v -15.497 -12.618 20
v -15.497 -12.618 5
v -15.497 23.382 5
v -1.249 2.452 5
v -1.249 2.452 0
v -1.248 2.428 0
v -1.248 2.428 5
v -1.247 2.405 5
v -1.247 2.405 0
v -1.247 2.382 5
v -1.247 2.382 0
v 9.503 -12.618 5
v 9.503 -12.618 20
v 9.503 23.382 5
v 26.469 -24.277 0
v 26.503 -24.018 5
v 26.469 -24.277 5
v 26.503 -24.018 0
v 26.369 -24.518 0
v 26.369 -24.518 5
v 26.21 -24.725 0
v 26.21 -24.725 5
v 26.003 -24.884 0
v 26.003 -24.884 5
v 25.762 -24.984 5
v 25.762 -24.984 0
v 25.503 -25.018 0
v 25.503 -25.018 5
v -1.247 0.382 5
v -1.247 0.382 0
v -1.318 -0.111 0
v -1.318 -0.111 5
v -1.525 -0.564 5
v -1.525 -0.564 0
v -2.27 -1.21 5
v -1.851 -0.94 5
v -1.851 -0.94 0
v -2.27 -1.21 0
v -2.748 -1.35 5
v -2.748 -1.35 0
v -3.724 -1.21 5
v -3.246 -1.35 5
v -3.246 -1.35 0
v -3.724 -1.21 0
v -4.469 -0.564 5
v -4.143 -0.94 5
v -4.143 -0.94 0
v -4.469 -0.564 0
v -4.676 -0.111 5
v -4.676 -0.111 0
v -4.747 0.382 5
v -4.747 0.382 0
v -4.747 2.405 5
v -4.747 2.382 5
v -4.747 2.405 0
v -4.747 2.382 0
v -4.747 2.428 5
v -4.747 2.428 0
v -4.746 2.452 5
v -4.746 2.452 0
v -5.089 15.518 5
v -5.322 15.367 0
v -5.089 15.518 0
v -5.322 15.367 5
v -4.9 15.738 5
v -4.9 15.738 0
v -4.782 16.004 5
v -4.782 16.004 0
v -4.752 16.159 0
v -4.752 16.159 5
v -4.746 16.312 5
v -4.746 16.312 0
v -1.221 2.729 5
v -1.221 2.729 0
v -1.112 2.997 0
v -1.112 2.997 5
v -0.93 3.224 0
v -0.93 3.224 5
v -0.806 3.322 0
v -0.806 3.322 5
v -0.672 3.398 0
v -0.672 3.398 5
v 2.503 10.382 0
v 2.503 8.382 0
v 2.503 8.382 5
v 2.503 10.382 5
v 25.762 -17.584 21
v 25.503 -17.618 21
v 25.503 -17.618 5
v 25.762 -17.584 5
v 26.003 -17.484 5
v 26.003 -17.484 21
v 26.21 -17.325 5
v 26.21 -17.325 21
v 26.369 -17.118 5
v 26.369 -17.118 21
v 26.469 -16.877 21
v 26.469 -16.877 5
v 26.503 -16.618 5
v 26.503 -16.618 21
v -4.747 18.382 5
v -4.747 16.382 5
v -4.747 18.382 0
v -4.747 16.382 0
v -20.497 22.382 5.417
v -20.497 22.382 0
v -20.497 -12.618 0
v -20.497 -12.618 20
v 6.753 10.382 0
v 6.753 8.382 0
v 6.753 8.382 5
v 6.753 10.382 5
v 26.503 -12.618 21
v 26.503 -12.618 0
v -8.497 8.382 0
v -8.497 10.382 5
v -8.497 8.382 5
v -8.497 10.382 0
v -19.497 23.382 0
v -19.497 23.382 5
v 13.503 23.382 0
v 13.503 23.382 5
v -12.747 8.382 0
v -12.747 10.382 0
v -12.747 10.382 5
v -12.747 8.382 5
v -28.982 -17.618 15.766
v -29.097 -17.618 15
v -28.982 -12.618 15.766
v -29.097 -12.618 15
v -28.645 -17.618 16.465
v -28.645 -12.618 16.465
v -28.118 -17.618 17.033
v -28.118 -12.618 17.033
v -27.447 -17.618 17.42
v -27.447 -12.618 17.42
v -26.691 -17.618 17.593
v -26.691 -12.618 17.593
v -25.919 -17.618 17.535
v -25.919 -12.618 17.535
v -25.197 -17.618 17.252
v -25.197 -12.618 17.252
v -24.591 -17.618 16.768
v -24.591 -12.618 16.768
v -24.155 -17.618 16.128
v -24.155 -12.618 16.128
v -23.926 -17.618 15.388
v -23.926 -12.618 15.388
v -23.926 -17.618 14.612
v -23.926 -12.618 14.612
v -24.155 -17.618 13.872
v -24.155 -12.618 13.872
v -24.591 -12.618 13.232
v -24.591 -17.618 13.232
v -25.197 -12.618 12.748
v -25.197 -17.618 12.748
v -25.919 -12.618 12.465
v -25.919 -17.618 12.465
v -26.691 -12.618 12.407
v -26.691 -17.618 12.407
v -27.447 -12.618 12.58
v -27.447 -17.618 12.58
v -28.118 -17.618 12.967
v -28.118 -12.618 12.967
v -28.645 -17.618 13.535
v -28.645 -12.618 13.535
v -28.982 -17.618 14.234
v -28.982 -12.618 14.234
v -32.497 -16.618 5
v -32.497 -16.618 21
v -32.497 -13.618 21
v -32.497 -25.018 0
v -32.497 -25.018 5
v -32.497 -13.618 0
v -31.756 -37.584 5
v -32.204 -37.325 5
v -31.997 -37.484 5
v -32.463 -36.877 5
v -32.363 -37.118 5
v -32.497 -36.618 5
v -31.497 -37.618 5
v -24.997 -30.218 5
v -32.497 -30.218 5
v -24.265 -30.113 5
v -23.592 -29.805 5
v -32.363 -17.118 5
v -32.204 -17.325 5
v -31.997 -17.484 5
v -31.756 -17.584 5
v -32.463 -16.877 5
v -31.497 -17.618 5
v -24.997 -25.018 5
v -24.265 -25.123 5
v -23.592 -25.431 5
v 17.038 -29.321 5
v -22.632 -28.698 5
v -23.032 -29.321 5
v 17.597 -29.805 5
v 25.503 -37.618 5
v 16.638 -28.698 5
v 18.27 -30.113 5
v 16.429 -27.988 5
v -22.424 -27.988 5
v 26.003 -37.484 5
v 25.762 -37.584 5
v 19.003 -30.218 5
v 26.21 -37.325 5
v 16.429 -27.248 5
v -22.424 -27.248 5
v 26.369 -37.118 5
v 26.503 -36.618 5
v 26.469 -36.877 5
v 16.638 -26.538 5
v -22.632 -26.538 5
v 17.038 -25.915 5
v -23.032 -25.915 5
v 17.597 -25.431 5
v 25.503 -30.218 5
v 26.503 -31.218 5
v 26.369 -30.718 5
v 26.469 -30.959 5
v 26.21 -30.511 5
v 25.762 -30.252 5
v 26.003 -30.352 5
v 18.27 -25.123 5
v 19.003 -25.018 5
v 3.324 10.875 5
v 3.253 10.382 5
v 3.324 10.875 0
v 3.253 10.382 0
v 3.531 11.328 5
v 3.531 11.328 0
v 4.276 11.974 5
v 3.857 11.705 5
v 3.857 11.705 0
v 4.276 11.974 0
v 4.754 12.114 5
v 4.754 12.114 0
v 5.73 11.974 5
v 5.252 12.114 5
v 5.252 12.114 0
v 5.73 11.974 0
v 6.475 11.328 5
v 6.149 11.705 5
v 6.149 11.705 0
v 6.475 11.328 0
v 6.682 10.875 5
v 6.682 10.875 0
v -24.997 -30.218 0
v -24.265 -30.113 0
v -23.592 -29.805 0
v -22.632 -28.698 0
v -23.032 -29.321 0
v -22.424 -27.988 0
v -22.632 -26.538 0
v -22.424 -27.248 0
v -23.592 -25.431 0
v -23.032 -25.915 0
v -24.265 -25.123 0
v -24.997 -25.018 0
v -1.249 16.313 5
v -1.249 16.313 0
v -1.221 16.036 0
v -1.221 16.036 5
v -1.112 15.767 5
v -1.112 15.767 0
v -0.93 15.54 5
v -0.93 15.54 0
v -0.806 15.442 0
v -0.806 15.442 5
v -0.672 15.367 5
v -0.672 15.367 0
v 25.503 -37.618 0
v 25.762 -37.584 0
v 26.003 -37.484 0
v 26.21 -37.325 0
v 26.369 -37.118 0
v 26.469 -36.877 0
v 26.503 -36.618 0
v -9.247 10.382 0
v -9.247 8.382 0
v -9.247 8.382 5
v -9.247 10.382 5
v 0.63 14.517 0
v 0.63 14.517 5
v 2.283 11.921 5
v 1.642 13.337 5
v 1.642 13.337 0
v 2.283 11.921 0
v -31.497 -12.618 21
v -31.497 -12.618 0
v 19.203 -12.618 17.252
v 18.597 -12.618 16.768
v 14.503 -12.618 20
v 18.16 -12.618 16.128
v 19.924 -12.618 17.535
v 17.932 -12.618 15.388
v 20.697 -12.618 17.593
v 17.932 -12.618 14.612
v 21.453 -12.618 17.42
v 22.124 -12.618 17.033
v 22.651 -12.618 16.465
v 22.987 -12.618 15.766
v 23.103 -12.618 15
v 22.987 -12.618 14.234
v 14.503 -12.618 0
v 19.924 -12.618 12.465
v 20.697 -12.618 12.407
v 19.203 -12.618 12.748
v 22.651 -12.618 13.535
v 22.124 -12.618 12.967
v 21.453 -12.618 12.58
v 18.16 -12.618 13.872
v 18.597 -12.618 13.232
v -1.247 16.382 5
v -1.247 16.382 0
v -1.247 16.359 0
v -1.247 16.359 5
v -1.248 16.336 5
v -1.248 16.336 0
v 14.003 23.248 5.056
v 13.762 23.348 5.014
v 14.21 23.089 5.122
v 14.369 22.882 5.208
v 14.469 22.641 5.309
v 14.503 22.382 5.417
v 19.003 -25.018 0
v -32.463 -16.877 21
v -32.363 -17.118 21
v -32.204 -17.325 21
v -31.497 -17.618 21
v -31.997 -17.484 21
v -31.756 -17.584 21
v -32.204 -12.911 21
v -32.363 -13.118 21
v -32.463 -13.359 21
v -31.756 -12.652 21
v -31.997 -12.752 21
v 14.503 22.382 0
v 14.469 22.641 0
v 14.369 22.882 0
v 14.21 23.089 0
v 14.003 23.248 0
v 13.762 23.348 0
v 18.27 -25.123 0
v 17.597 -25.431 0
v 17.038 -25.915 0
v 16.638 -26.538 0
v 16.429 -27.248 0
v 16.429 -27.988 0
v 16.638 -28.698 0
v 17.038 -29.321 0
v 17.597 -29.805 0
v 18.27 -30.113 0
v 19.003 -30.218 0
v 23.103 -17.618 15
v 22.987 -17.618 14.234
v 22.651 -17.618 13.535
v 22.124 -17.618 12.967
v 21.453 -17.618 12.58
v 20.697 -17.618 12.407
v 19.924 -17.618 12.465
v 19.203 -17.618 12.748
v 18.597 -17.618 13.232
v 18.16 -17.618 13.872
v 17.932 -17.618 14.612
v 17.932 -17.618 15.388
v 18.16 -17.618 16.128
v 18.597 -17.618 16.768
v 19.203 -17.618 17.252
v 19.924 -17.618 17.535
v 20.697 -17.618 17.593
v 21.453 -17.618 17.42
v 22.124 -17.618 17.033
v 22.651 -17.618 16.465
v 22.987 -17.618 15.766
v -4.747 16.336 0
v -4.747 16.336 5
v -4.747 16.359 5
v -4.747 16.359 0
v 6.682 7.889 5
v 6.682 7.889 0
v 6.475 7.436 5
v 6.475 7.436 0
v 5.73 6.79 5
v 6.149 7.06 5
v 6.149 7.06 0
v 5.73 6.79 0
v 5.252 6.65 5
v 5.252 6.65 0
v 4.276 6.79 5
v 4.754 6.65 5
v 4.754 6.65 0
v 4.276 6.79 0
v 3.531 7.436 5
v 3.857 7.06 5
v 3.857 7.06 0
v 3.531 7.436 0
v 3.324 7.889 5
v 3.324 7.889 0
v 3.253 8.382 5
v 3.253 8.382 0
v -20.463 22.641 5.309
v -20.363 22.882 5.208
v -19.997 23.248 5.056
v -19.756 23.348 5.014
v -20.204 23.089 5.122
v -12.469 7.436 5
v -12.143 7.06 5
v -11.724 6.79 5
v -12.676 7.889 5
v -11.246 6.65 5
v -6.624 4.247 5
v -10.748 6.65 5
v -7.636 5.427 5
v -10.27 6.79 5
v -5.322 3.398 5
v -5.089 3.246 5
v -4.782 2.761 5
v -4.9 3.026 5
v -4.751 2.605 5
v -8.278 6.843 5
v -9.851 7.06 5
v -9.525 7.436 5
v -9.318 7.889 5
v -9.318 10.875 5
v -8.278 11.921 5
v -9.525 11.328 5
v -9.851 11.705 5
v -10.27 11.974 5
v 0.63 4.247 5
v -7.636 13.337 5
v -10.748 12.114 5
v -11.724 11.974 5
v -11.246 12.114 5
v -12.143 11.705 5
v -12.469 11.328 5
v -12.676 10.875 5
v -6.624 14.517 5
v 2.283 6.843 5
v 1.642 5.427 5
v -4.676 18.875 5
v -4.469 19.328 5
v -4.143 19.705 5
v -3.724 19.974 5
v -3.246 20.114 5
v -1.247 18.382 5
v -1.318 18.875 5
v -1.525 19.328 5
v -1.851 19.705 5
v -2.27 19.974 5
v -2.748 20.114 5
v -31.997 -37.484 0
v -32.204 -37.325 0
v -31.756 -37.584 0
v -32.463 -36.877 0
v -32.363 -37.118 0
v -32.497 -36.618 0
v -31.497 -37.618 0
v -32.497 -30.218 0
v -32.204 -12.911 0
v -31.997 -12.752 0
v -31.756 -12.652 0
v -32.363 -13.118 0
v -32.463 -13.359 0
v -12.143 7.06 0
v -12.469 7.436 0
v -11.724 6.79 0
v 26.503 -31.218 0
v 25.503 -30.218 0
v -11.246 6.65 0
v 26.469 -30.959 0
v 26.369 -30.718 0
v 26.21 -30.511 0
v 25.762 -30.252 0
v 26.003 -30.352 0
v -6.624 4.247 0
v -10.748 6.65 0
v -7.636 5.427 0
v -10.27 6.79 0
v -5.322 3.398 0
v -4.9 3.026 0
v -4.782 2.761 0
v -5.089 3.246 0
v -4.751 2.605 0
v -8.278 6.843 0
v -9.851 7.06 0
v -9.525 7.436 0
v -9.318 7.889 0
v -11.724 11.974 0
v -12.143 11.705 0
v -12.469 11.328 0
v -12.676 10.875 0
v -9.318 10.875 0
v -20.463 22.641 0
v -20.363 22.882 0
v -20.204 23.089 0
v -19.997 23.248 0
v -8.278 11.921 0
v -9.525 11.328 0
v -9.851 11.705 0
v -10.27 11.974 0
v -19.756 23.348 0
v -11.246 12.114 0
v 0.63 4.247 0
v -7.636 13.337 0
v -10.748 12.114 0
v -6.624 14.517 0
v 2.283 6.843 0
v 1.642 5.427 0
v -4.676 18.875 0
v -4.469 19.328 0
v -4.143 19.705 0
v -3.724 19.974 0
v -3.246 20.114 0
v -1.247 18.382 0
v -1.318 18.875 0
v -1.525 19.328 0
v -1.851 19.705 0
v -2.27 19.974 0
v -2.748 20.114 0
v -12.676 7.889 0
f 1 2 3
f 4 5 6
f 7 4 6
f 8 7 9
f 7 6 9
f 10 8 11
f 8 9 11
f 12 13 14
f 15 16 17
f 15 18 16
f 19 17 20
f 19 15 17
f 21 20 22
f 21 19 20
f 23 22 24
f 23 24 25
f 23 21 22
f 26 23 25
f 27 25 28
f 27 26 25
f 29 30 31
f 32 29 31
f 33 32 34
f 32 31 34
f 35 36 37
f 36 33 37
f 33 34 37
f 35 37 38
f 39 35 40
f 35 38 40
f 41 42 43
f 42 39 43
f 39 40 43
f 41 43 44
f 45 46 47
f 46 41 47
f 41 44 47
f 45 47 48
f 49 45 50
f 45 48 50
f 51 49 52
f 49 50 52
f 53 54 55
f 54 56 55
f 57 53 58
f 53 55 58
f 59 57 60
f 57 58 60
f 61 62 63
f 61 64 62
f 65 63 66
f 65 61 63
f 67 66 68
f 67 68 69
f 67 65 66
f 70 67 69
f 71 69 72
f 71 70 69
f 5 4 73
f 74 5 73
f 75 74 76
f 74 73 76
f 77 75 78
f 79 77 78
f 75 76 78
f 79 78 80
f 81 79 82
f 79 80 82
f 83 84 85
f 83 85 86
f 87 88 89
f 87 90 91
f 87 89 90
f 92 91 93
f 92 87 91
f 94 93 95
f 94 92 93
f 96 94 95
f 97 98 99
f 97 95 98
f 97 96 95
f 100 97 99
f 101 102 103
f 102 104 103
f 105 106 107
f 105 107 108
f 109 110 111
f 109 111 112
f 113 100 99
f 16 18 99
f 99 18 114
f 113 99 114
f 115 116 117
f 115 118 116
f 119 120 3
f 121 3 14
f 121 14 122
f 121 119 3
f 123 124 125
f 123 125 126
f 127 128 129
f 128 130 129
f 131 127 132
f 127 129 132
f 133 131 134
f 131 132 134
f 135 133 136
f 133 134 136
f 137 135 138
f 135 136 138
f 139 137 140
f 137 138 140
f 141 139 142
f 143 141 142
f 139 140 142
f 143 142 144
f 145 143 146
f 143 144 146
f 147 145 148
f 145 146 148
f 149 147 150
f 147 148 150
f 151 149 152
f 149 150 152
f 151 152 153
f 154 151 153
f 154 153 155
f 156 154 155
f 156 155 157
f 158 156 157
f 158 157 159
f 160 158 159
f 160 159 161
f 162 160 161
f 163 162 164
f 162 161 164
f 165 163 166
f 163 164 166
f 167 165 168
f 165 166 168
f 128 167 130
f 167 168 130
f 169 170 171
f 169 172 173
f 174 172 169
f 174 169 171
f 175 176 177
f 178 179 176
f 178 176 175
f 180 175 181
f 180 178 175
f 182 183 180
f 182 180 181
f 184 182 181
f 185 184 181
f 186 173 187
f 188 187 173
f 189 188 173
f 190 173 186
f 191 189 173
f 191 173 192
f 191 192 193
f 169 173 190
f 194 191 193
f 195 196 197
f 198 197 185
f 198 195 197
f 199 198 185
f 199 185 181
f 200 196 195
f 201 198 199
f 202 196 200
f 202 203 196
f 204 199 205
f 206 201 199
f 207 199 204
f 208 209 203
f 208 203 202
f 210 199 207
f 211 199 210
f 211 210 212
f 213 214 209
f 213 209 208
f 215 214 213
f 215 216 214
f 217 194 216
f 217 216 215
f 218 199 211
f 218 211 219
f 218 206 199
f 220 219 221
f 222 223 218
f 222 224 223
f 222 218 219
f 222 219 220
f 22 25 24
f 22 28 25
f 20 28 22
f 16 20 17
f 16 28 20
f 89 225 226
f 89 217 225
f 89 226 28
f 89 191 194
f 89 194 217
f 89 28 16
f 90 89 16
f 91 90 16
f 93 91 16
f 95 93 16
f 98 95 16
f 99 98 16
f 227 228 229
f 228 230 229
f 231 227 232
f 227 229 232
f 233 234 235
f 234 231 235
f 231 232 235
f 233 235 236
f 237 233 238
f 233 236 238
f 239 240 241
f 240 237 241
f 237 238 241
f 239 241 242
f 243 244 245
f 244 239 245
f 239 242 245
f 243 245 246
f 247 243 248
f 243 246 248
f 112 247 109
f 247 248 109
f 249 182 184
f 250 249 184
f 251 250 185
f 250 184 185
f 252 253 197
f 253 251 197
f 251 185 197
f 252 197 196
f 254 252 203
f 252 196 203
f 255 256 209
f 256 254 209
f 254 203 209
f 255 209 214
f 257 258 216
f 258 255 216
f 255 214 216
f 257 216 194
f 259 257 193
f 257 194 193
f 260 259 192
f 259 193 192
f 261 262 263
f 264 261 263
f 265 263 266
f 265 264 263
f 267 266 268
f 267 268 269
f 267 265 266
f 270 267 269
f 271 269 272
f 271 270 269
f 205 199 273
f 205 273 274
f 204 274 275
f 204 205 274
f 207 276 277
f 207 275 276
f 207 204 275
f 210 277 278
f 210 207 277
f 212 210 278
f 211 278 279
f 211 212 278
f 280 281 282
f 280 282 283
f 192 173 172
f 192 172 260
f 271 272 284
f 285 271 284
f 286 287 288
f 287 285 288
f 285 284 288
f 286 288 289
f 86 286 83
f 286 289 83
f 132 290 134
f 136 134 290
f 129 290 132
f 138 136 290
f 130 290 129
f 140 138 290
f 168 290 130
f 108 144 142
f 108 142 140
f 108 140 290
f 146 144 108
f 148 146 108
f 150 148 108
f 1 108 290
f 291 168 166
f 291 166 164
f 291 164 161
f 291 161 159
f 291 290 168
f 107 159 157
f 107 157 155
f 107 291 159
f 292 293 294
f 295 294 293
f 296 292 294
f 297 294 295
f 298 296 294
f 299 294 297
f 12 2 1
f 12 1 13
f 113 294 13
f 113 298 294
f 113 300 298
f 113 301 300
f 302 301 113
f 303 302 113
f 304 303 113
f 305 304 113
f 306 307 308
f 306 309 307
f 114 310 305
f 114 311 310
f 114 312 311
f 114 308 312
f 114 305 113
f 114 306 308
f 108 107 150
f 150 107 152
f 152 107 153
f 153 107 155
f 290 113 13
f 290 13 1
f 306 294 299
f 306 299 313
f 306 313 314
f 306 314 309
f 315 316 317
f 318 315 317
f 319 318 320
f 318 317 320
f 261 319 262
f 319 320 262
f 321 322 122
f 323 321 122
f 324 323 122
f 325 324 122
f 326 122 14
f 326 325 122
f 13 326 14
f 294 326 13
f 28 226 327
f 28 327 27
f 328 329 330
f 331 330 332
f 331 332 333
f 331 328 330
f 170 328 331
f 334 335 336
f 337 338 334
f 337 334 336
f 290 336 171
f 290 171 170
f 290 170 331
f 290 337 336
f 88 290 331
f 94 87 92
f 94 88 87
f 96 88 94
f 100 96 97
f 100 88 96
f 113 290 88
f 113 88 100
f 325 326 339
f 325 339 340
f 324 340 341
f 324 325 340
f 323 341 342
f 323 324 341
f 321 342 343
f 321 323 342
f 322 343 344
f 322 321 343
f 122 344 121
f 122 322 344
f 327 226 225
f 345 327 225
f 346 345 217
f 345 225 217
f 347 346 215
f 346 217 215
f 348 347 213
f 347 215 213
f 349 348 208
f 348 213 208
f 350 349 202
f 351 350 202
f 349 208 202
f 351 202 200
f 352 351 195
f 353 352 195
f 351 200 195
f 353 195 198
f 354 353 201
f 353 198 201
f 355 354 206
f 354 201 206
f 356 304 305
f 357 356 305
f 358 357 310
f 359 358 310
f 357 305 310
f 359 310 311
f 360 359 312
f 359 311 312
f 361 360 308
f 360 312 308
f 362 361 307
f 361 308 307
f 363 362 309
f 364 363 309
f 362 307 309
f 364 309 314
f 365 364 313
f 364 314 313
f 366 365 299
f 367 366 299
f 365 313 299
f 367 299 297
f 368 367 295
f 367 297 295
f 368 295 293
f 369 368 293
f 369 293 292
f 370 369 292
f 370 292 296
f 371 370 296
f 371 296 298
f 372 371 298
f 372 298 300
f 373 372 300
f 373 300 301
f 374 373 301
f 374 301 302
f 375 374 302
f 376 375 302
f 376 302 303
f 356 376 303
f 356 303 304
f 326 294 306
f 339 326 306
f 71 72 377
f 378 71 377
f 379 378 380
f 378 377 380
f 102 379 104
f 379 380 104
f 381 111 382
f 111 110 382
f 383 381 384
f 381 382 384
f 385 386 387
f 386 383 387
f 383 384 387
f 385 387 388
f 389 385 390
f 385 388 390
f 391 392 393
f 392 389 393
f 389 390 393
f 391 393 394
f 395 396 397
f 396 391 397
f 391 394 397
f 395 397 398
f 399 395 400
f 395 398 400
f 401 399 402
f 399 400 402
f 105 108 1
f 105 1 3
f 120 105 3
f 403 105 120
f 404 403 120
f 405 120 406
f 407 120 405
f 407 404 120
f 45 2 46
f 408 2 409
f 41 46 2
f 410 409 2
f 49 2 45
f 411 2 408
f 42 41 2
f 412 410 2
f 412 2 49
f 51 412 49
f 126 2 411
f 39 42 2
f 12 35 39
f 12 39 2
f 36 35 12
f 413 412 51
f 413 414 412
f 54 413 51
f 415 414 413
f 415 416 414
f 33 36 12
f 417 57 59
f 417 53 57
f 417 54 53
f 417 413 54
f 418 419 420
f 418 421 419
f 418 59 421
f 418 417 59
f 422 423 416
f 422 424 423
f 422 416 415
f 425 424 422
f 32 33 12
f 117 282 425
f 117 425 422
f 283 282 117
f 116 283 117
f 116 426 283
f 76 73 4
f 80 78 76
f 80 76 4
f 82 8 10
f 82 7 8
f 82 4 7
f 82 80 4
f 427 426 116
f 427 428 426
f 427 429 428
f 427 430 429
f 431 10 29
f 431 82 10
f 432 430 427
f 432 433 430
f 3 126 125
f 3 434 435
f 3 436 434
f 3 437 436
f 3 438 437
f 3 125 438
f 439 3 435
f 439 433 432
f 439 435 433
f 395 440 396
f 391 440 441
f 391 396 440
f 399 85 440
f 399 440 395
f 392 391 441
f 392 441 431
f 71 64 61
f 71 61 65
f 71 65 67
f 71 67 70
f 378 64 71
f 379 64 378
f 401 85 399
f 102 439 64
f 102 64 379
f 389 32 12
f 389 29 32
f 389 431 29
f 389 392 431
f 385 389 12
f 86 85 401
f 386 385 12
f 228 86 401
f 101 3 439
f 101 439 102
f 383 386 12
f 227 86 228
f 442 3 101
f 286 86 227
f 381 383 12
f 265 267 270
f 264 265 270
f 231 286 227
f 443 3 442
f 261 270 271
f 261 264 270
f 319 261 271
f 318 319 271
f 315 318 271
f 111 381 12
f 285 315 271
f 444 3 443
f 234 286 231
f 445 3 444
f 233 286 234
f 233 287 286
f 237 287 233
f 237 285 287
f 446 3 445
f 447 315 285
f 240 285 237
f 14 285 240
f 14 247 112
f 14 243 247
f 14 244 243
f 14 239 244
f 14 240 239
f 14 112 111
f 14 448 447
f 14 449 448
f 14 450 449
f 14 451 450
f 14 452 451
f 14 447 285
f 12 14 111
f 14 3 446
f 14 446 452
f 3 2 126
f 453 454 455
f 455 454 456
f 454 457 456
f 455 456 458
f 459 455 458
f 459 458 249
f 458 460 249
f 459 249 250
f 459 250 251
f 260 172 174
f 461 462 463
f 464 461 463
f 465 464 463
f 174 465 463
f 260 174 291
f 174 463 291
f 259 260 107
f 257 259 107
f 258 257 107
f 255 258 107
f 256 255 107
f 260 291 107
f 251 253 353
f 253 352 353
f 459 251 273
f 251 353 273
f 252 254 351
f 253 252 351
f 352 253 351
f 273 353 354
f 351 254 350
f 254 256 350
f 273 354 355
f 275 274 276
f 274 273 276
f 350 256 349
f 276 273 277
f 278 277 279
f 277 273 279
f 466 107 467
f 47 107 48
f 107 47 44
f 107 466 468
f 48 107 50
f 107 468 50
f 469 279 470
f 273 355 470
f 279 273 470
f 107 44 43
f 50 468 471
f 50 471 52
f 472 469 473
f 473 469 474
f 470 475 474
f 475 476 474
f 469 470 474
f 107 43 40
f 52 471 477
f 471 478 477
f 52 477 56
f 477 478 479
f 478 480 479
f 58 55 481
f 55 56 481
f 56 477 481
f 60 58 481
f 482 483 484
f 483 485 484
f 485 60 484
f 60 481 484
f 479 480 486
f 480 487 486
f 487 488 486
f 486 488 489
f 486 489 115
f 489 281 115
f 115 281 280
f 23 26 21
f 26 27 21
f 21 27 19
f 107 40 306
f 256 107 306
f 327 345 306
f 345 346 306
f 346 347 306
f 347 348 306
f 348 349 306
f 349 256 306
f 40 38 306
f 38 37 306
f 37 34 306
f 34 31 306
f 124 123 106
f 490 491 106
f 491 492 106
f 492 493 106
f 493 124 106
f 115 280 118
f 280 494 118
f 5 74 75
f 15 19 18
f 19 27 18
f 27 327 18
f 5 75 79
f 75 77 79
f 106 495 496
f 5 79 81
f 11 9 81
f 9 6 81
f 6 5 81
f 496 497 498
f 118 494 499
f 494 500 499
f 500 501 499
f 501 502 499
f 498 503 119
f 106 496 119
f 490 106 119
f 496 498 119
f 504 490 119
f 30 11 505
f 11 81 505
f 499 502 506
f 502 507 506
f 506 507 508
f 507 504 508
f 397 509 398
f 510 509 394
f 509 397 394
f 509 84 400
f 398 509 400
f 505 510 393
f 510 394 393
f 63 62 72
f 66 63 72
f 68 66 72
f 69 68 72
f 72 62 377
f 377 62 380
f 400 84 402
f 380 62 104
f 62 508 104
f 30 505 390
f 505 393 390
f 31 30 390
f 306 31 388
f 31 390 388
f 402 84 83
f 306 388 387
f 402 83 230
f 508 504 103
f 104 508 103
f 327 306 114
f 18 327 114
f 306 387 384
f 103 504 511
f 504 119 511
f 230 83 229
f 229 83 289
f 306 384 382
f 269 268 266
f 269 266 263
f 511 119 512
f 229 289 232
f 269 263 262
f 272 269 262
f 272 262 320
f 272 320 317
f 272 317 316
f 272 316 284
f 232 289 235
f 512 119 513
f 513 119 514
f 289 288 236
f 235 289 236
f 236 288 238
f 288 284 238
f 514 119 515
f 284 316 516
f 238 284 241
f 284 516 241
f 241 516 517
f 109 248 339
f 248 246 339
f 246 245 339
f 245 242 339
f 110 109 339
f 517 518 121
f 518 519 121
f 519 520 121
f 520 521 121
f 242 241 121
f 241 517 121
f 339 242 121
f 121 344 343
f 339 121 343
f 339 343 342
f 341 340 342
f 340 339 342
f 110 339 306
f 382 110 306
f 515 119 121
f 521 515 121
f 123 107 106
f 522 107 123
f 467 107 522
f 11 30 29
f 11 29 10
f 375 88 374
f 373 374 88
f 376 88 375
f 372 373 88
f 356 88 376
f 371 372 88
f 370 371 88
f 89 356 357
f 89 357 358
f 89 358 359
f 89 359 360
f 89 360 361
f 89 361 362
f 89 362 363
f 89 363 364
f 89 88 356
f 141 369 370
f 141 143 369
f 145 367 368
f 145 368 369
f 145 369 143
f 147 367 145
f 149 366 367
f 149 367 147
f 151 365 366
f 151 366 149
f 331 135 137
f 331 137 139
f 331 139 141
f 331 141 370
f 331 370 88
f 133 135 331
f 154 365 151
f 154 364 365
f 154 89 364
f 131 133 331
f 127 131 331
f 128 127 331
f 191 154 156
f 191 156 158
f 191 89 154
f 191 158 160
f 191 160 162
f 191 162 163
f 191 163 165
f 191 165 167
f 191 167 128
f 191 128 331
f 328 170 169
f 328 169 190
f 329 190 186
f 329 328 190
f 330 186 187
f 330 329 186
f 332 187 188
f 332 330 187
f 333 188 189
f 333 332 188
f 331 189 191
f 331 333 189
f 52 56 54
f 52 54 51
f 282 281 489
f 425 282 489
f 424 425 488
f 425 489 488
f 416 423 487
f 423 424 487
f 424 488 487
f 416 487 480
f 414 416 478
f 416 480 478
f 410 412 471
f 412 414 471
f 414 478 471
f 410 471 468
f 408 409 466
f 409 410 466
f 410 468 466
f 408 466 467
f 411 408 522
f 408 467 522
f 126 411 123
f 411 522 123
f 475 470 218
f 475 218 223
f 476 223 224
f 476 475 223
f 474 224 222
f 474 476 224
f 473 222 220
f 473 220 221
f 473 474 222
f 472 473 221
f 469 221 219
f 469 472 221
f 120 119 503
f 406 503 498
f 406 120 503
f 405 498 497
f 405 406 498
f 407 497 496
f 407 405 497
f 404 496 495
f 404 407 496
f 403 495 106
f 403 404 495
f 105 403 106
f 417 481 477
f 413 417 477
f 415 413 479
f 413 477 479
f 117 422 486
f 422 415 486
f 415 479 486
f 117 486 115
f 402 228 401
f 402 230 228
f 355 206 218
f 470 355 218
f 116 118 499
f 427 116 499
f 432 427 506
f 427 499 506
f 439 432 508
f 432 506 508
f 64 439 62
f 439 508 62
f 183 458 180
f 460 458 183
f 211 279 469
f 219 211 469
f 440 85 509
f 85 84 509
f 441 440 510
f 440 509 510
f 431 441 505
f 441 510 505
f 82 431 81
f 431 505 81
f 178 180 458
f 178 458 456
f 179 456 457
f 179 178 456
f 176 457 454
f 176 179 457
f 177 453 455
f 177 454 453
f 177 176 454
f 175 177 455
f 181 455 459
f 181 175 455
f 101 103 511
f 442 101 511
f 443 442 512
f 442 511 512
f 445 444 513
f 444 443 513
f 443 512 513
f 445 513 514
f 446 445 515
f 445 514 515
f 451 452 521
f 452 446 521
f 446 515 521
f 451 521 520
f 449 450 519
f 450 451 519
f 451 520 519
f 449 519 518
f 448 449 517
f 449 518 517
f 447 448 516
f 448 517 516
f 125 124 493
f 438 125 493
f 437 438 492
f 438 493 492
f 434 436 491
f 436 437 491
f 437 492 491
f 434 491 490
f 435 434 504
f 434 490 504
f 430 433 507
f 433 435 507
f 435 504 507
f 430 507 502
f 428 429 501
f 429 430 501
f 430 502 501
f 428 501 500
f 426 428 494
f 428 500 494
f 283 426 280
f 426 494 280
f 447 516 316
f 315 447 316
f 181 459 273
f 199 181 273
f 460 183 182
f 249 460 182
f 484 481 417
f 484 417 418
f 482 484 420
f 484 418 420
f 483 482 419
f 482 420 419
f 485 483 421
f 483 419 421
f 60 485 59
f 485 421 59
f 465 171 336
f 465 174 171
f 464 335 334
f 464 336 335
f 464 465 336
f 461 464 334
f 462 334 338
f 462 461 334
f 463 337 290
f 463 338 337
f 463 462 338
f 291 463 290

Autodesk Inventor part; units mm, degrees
ref_plane "YZ Plane" through (0, 0, 0) normal (1, 0, 0) x (0, 1, 0)
ref_plane "XZ Plane" through (0, 0, 0) normal (0, 1, 0) x (-1, 0, 0)
sketch "Sketch1" plane through (0, 0, 0) normal (0, 0, 1) x (1, 0, 0)
  line L0 (9.5028, 23.3821) -> (9.5028, -12.6179)
  line L1 (14.5028, 23.3821) -> (14.5028, -12.6179)
  line L2 (26.5028, -12.6179) -> (26.5028, -37.6179)
  line L3 (-32.4972, -17.6179) -> (26.5028, -17.6179)
  line L4 (-32.4972, -12.6179) -> (-20.4972, -12.6179)
  line L5 (-15.4972, -12.6179) -> (9.5028, -12.6179)
  line L6 (14.5028, -12.6179) -> (26.5028, -12.6179)
  line L7 (-20.4972, 23.3821) -> (14.5028, 23.3821)
  line L8 (-15.4972, 23.3821) -> (-15.4972, -12.6179)
  line L9 (-20.4972, 23.3821) -> (-20.4972, -12.6179)
  line L10 (-32.4972, -37.6179) -> (26.5028, -37.6179)
  line L11 (-32.4972, -12.6179) -> (-32.4972, -37.6179)
  line L12 (-2.9972, 1.3821) -> (-2.9972, 17.3821) construction
  line L13 (5.0028, 9.3821) -> (-10.9972, 9.3821) construction
  circle A0 centre (-2.9972, 9.3821) radius 8 construction
  line L14 (-2.9972, 10.3821) -> (-2.9972, 8.3821) construction
  line L15 (-8.4972, 10.3821) -> (-8.4972, 8.3821)
  line L16 (2.5028, 8.3821) -> (2.5028, 10.3821)
  line L17 (-2.9972, 2.3821) -> (-2.9972, 0.3821) construction
  line L18 (-4.7472, 2.3821) -> (-4.7472, 0.3821)
  line L19 (-1.2472, 0.3821) -> (-1.2472, 2.3821)
  arc A1 (-4.7472, 0.3821) -> (-1.2472, 0.3821) centre (-2.9972, 0.3821) ccw
  line L20 (-10.9972, 10.3821) -> (-10.9972, 8.3821) construction
  line L21 (-12.7472, 10.3821) -> (-12.7472, 8.3821)
  line L22 (-9.2472, 8.3821) -> (-9.2472, 10.3821)
  arc A2 (-9.2472, 10.3821) -> (-12.7472, 10.3821) centre (-10.9972, 10.3821) ccw
  arc A3 (-12.7472, 8.3821) -> (-9.2472, 8.3821) centre (-10.9972, 8.3821) ccw
  line L23 (5.0028, 10.3821) -> (5.0028, 8.3821) construction
  line L24 (3.2528, 10.3821) -> (3.2528, 8.3821)
  line L25 (6.7528, 8.3821) -> (6.7528, 10.3821)
  arc A4 (6.7528, 10.3821) -> (3.2528, 10.3821) centre (5.0028, 10.3821) ccw
  arc A5 (3.2528, 8.3821) -> (6.7528, 8.3821) centre (5.0028, 8.3821) ccw
  line L26 (-2.9972, 18.3821) -> (-2.9972, 16.3821) construction
  line L27 (-1.2472, 18.3821) -> (-1.2472, 16.3821)
  line L28 (-4.7472, 16.3821) -> (-4.7472, 18.3821)
  arc A6 (-1.2472, 18.3821) -> (-4.7472, 18.3821) centre (-2.9972, 18.3821) ccw
  arc A7 (-1.2472, 2.3821) -> (-1.4087, 3.1165) centre (-2.9972, 2.3821) ccw
  arc A8 (-4.5856, 3.1165) -> (-4.7472, 2.3821) centre (-2.9972, 2.3821) ccw
  arc A9 (-8.4972, 8.3821) -> (-4.5856, 3.1165) centre (-2.9972, 8.3821) ccw
  arc A10 (-1.4087, 3.1165) -> (2.5028, 8.3821) centre (-2.9972, 8.3821) ccw
  arc A11 (-4.7472, 16.3821) -> (-4.5856, 15.6478) centre (-2.9972, 16.3821) ccw
  arc A12 (-1.4087, 15.6478) -> (-1.2472, 16.3821) centre (-2.9972, 16.3821) ccw
  arc A13 (2.5028, 10.3821) -> (-1.4087, 15.6478) centre (-2.9972, 10.3821) ccw
  arc A14 (-4.5856, 15.6478) -> (-8.4972, 10.3821) centre (-2.9972, 10.3821) ccw
  point P0 (0, 0)
  point P1 (14.5028, 29.202)
  point P2 (-20.4972, 29.202)
  dimension "d51" = 16
  dimension "d52" = 5
  dimension "d53" = 5
  dimension "d54" = 25
  dimension "d55" = 5
  dimension "d56" = 20
  dimension "d58" = 27
  dimension "d59" = 14
  dimension "d60" = 12
  dimension "d61" = 12
  dimension "d64" = 12.5
  dimension "d66" = 2
  dimension "d67" = 3.5
  dimension "d68" = 2
  dimension "d69" = 3.5
  dimension "d70" = 2
  dimension "d71" = 3.5
  dimension "d72" = 2
  dimension "d73" = 3.5
  dimension "d74" = 2
extrude "Extrusion1" add sketch "Sketch1" along normal blind 5
sketch "Sketch2" plane through (0, 0, 5) normal (0, 0, 1) x (1, 0, 0)
  line L0 (26.5028, -37.6179) -> (26.5028, -12.6179) projected
  line L1 (-32.4972, -12.6179) -> (26.5028, -12.6179)
  line L2 (26.5028, -12.6179) -> (26.5028, -17.6179)
  line L3 (26.5028, -17.6179) -> (-32.4972, -17.6179)
  line L4 (-32.4972, -17.6179) -> (-32.4972, -12.6179)
  line L5 (-32.4972, -12.6179) -> (-32.4972, -37.6179) projected
  line L6 (26.5028, -12.6179) -> (14.5028, -12.6179) projected
  point P0 (0, 0)
  dimension "d30" = 5
extrude "Extrusion2" add sketch "Sketch2" along normal blind 16
sketch "Sketch3" plane through (14.5028, -12.6179, 0) normal (1, 0, 0) x (0, 0, -1)
  line L0 (0, 0) -> (-21, 0) projected
  line L1 (-5, 0) -> (-5, 36) projected
  line L2 (-21, 0) -> (-5, 0)
  line L3 (-5, 36) -> (-20, 0)
  point P0 (0, 12.6179)
  point P1 (-5, 31)
  dimension "d77" = 15
extrude "Extrusion3" add sketch "Sketch3" against normal blind 5
sketch "Sketch4" plane through (14.5028, -12.6179, 0) normal (0, 1, 0) x (1, 0, 0)
  circle A0 centre (6, -15) radius 2.6
  line L0 (12, 0) -> (12, -21) projected
  line L1 (12, -21) -> (-47, -21) projected
  point P0 (-14.5028, 0)
  point P1 (0, -25)
  dimension "d36" = 5.2
  dimension "d37" = 6
  dimension "d38" = 6
extrude "Extrusion4" cut sketch "Sketch4" against normal through all
sketch "Sketch5" plane through (0, 0, 5) normal (0, 0, 1) x (1, 0, 0)
  arc A0 (19.0028, -25.0179) -> (19.0028, -30.2179) centre (19.0028, -27.6179) ccw
  line L0 (26.5028, -37.6179) -> (26.5028, -17.6179) projected
  line L1 (-32.4972, -37.6179) -> (26.5028, -37.6179) projected
  line L2 (19.0028, -25.0179) -> (26.5028, -25.0179)
  line L3 (19.0028, -30.2179) -> (26.5028, -30.2179)
  line L4 (26.5028, -37.6179) -> (26.5028, -12.6179) projected
  line L5 (26.5028, -25.0179) -> (26.5028, -30.2179)
  point P0 (0, 0)
  point P1 (-34.4972, -33.6179)
  point P2 (17.5028, -33.6179)
  dimension "d41" = 7.5
  dimension "d42" = 10
  dimension "d43" = 5.2
extrude "Extrusion5" cut sketch "Sketch5" against normal blind 5
fillet "Fillet1" radius 1 5 edges at (-32.4972, -12.6179, 10.5) (-32.4972, -17.6179, 13) (26.5028, -30.2179, 2.5) (26.5028, -25.0179, 2.5) (26.5028, -17.6179, 13)
ref_plane "Work Plane2" through (-2.9972, 0.3821, 0) normal (1, 0, 0) x (0, 0, 1)
mirror "Mirror2" about plane through (-2.9972, 0.3821, 0) normal (1, 0, 0) of "Extrusion5", "Extrusion4", "Extrusion3"
fillet "Fillet2" radius 1 8 edges at (14.5028, 23.3821, 2.5) (-20.4972, 23.3821, 2.5) (26.5028, -37.6179, 2.5) (-32.4972, -37.6179, 2.5) (-1.4087, 3.1165, 2.5) (-4.5856, 3.1165, 2.5) (-1.4087, 15.6478, 2.5) (-4.5856, 15.6478, 2.5)
ref_plane "Work Plane3" through (-2.9972, -12.6179, 0) normal (-1, 0, 0) x (0, 0, 1)
properties part number "Z Nut Braket 1.0" material "PC/ABS Plastic"
